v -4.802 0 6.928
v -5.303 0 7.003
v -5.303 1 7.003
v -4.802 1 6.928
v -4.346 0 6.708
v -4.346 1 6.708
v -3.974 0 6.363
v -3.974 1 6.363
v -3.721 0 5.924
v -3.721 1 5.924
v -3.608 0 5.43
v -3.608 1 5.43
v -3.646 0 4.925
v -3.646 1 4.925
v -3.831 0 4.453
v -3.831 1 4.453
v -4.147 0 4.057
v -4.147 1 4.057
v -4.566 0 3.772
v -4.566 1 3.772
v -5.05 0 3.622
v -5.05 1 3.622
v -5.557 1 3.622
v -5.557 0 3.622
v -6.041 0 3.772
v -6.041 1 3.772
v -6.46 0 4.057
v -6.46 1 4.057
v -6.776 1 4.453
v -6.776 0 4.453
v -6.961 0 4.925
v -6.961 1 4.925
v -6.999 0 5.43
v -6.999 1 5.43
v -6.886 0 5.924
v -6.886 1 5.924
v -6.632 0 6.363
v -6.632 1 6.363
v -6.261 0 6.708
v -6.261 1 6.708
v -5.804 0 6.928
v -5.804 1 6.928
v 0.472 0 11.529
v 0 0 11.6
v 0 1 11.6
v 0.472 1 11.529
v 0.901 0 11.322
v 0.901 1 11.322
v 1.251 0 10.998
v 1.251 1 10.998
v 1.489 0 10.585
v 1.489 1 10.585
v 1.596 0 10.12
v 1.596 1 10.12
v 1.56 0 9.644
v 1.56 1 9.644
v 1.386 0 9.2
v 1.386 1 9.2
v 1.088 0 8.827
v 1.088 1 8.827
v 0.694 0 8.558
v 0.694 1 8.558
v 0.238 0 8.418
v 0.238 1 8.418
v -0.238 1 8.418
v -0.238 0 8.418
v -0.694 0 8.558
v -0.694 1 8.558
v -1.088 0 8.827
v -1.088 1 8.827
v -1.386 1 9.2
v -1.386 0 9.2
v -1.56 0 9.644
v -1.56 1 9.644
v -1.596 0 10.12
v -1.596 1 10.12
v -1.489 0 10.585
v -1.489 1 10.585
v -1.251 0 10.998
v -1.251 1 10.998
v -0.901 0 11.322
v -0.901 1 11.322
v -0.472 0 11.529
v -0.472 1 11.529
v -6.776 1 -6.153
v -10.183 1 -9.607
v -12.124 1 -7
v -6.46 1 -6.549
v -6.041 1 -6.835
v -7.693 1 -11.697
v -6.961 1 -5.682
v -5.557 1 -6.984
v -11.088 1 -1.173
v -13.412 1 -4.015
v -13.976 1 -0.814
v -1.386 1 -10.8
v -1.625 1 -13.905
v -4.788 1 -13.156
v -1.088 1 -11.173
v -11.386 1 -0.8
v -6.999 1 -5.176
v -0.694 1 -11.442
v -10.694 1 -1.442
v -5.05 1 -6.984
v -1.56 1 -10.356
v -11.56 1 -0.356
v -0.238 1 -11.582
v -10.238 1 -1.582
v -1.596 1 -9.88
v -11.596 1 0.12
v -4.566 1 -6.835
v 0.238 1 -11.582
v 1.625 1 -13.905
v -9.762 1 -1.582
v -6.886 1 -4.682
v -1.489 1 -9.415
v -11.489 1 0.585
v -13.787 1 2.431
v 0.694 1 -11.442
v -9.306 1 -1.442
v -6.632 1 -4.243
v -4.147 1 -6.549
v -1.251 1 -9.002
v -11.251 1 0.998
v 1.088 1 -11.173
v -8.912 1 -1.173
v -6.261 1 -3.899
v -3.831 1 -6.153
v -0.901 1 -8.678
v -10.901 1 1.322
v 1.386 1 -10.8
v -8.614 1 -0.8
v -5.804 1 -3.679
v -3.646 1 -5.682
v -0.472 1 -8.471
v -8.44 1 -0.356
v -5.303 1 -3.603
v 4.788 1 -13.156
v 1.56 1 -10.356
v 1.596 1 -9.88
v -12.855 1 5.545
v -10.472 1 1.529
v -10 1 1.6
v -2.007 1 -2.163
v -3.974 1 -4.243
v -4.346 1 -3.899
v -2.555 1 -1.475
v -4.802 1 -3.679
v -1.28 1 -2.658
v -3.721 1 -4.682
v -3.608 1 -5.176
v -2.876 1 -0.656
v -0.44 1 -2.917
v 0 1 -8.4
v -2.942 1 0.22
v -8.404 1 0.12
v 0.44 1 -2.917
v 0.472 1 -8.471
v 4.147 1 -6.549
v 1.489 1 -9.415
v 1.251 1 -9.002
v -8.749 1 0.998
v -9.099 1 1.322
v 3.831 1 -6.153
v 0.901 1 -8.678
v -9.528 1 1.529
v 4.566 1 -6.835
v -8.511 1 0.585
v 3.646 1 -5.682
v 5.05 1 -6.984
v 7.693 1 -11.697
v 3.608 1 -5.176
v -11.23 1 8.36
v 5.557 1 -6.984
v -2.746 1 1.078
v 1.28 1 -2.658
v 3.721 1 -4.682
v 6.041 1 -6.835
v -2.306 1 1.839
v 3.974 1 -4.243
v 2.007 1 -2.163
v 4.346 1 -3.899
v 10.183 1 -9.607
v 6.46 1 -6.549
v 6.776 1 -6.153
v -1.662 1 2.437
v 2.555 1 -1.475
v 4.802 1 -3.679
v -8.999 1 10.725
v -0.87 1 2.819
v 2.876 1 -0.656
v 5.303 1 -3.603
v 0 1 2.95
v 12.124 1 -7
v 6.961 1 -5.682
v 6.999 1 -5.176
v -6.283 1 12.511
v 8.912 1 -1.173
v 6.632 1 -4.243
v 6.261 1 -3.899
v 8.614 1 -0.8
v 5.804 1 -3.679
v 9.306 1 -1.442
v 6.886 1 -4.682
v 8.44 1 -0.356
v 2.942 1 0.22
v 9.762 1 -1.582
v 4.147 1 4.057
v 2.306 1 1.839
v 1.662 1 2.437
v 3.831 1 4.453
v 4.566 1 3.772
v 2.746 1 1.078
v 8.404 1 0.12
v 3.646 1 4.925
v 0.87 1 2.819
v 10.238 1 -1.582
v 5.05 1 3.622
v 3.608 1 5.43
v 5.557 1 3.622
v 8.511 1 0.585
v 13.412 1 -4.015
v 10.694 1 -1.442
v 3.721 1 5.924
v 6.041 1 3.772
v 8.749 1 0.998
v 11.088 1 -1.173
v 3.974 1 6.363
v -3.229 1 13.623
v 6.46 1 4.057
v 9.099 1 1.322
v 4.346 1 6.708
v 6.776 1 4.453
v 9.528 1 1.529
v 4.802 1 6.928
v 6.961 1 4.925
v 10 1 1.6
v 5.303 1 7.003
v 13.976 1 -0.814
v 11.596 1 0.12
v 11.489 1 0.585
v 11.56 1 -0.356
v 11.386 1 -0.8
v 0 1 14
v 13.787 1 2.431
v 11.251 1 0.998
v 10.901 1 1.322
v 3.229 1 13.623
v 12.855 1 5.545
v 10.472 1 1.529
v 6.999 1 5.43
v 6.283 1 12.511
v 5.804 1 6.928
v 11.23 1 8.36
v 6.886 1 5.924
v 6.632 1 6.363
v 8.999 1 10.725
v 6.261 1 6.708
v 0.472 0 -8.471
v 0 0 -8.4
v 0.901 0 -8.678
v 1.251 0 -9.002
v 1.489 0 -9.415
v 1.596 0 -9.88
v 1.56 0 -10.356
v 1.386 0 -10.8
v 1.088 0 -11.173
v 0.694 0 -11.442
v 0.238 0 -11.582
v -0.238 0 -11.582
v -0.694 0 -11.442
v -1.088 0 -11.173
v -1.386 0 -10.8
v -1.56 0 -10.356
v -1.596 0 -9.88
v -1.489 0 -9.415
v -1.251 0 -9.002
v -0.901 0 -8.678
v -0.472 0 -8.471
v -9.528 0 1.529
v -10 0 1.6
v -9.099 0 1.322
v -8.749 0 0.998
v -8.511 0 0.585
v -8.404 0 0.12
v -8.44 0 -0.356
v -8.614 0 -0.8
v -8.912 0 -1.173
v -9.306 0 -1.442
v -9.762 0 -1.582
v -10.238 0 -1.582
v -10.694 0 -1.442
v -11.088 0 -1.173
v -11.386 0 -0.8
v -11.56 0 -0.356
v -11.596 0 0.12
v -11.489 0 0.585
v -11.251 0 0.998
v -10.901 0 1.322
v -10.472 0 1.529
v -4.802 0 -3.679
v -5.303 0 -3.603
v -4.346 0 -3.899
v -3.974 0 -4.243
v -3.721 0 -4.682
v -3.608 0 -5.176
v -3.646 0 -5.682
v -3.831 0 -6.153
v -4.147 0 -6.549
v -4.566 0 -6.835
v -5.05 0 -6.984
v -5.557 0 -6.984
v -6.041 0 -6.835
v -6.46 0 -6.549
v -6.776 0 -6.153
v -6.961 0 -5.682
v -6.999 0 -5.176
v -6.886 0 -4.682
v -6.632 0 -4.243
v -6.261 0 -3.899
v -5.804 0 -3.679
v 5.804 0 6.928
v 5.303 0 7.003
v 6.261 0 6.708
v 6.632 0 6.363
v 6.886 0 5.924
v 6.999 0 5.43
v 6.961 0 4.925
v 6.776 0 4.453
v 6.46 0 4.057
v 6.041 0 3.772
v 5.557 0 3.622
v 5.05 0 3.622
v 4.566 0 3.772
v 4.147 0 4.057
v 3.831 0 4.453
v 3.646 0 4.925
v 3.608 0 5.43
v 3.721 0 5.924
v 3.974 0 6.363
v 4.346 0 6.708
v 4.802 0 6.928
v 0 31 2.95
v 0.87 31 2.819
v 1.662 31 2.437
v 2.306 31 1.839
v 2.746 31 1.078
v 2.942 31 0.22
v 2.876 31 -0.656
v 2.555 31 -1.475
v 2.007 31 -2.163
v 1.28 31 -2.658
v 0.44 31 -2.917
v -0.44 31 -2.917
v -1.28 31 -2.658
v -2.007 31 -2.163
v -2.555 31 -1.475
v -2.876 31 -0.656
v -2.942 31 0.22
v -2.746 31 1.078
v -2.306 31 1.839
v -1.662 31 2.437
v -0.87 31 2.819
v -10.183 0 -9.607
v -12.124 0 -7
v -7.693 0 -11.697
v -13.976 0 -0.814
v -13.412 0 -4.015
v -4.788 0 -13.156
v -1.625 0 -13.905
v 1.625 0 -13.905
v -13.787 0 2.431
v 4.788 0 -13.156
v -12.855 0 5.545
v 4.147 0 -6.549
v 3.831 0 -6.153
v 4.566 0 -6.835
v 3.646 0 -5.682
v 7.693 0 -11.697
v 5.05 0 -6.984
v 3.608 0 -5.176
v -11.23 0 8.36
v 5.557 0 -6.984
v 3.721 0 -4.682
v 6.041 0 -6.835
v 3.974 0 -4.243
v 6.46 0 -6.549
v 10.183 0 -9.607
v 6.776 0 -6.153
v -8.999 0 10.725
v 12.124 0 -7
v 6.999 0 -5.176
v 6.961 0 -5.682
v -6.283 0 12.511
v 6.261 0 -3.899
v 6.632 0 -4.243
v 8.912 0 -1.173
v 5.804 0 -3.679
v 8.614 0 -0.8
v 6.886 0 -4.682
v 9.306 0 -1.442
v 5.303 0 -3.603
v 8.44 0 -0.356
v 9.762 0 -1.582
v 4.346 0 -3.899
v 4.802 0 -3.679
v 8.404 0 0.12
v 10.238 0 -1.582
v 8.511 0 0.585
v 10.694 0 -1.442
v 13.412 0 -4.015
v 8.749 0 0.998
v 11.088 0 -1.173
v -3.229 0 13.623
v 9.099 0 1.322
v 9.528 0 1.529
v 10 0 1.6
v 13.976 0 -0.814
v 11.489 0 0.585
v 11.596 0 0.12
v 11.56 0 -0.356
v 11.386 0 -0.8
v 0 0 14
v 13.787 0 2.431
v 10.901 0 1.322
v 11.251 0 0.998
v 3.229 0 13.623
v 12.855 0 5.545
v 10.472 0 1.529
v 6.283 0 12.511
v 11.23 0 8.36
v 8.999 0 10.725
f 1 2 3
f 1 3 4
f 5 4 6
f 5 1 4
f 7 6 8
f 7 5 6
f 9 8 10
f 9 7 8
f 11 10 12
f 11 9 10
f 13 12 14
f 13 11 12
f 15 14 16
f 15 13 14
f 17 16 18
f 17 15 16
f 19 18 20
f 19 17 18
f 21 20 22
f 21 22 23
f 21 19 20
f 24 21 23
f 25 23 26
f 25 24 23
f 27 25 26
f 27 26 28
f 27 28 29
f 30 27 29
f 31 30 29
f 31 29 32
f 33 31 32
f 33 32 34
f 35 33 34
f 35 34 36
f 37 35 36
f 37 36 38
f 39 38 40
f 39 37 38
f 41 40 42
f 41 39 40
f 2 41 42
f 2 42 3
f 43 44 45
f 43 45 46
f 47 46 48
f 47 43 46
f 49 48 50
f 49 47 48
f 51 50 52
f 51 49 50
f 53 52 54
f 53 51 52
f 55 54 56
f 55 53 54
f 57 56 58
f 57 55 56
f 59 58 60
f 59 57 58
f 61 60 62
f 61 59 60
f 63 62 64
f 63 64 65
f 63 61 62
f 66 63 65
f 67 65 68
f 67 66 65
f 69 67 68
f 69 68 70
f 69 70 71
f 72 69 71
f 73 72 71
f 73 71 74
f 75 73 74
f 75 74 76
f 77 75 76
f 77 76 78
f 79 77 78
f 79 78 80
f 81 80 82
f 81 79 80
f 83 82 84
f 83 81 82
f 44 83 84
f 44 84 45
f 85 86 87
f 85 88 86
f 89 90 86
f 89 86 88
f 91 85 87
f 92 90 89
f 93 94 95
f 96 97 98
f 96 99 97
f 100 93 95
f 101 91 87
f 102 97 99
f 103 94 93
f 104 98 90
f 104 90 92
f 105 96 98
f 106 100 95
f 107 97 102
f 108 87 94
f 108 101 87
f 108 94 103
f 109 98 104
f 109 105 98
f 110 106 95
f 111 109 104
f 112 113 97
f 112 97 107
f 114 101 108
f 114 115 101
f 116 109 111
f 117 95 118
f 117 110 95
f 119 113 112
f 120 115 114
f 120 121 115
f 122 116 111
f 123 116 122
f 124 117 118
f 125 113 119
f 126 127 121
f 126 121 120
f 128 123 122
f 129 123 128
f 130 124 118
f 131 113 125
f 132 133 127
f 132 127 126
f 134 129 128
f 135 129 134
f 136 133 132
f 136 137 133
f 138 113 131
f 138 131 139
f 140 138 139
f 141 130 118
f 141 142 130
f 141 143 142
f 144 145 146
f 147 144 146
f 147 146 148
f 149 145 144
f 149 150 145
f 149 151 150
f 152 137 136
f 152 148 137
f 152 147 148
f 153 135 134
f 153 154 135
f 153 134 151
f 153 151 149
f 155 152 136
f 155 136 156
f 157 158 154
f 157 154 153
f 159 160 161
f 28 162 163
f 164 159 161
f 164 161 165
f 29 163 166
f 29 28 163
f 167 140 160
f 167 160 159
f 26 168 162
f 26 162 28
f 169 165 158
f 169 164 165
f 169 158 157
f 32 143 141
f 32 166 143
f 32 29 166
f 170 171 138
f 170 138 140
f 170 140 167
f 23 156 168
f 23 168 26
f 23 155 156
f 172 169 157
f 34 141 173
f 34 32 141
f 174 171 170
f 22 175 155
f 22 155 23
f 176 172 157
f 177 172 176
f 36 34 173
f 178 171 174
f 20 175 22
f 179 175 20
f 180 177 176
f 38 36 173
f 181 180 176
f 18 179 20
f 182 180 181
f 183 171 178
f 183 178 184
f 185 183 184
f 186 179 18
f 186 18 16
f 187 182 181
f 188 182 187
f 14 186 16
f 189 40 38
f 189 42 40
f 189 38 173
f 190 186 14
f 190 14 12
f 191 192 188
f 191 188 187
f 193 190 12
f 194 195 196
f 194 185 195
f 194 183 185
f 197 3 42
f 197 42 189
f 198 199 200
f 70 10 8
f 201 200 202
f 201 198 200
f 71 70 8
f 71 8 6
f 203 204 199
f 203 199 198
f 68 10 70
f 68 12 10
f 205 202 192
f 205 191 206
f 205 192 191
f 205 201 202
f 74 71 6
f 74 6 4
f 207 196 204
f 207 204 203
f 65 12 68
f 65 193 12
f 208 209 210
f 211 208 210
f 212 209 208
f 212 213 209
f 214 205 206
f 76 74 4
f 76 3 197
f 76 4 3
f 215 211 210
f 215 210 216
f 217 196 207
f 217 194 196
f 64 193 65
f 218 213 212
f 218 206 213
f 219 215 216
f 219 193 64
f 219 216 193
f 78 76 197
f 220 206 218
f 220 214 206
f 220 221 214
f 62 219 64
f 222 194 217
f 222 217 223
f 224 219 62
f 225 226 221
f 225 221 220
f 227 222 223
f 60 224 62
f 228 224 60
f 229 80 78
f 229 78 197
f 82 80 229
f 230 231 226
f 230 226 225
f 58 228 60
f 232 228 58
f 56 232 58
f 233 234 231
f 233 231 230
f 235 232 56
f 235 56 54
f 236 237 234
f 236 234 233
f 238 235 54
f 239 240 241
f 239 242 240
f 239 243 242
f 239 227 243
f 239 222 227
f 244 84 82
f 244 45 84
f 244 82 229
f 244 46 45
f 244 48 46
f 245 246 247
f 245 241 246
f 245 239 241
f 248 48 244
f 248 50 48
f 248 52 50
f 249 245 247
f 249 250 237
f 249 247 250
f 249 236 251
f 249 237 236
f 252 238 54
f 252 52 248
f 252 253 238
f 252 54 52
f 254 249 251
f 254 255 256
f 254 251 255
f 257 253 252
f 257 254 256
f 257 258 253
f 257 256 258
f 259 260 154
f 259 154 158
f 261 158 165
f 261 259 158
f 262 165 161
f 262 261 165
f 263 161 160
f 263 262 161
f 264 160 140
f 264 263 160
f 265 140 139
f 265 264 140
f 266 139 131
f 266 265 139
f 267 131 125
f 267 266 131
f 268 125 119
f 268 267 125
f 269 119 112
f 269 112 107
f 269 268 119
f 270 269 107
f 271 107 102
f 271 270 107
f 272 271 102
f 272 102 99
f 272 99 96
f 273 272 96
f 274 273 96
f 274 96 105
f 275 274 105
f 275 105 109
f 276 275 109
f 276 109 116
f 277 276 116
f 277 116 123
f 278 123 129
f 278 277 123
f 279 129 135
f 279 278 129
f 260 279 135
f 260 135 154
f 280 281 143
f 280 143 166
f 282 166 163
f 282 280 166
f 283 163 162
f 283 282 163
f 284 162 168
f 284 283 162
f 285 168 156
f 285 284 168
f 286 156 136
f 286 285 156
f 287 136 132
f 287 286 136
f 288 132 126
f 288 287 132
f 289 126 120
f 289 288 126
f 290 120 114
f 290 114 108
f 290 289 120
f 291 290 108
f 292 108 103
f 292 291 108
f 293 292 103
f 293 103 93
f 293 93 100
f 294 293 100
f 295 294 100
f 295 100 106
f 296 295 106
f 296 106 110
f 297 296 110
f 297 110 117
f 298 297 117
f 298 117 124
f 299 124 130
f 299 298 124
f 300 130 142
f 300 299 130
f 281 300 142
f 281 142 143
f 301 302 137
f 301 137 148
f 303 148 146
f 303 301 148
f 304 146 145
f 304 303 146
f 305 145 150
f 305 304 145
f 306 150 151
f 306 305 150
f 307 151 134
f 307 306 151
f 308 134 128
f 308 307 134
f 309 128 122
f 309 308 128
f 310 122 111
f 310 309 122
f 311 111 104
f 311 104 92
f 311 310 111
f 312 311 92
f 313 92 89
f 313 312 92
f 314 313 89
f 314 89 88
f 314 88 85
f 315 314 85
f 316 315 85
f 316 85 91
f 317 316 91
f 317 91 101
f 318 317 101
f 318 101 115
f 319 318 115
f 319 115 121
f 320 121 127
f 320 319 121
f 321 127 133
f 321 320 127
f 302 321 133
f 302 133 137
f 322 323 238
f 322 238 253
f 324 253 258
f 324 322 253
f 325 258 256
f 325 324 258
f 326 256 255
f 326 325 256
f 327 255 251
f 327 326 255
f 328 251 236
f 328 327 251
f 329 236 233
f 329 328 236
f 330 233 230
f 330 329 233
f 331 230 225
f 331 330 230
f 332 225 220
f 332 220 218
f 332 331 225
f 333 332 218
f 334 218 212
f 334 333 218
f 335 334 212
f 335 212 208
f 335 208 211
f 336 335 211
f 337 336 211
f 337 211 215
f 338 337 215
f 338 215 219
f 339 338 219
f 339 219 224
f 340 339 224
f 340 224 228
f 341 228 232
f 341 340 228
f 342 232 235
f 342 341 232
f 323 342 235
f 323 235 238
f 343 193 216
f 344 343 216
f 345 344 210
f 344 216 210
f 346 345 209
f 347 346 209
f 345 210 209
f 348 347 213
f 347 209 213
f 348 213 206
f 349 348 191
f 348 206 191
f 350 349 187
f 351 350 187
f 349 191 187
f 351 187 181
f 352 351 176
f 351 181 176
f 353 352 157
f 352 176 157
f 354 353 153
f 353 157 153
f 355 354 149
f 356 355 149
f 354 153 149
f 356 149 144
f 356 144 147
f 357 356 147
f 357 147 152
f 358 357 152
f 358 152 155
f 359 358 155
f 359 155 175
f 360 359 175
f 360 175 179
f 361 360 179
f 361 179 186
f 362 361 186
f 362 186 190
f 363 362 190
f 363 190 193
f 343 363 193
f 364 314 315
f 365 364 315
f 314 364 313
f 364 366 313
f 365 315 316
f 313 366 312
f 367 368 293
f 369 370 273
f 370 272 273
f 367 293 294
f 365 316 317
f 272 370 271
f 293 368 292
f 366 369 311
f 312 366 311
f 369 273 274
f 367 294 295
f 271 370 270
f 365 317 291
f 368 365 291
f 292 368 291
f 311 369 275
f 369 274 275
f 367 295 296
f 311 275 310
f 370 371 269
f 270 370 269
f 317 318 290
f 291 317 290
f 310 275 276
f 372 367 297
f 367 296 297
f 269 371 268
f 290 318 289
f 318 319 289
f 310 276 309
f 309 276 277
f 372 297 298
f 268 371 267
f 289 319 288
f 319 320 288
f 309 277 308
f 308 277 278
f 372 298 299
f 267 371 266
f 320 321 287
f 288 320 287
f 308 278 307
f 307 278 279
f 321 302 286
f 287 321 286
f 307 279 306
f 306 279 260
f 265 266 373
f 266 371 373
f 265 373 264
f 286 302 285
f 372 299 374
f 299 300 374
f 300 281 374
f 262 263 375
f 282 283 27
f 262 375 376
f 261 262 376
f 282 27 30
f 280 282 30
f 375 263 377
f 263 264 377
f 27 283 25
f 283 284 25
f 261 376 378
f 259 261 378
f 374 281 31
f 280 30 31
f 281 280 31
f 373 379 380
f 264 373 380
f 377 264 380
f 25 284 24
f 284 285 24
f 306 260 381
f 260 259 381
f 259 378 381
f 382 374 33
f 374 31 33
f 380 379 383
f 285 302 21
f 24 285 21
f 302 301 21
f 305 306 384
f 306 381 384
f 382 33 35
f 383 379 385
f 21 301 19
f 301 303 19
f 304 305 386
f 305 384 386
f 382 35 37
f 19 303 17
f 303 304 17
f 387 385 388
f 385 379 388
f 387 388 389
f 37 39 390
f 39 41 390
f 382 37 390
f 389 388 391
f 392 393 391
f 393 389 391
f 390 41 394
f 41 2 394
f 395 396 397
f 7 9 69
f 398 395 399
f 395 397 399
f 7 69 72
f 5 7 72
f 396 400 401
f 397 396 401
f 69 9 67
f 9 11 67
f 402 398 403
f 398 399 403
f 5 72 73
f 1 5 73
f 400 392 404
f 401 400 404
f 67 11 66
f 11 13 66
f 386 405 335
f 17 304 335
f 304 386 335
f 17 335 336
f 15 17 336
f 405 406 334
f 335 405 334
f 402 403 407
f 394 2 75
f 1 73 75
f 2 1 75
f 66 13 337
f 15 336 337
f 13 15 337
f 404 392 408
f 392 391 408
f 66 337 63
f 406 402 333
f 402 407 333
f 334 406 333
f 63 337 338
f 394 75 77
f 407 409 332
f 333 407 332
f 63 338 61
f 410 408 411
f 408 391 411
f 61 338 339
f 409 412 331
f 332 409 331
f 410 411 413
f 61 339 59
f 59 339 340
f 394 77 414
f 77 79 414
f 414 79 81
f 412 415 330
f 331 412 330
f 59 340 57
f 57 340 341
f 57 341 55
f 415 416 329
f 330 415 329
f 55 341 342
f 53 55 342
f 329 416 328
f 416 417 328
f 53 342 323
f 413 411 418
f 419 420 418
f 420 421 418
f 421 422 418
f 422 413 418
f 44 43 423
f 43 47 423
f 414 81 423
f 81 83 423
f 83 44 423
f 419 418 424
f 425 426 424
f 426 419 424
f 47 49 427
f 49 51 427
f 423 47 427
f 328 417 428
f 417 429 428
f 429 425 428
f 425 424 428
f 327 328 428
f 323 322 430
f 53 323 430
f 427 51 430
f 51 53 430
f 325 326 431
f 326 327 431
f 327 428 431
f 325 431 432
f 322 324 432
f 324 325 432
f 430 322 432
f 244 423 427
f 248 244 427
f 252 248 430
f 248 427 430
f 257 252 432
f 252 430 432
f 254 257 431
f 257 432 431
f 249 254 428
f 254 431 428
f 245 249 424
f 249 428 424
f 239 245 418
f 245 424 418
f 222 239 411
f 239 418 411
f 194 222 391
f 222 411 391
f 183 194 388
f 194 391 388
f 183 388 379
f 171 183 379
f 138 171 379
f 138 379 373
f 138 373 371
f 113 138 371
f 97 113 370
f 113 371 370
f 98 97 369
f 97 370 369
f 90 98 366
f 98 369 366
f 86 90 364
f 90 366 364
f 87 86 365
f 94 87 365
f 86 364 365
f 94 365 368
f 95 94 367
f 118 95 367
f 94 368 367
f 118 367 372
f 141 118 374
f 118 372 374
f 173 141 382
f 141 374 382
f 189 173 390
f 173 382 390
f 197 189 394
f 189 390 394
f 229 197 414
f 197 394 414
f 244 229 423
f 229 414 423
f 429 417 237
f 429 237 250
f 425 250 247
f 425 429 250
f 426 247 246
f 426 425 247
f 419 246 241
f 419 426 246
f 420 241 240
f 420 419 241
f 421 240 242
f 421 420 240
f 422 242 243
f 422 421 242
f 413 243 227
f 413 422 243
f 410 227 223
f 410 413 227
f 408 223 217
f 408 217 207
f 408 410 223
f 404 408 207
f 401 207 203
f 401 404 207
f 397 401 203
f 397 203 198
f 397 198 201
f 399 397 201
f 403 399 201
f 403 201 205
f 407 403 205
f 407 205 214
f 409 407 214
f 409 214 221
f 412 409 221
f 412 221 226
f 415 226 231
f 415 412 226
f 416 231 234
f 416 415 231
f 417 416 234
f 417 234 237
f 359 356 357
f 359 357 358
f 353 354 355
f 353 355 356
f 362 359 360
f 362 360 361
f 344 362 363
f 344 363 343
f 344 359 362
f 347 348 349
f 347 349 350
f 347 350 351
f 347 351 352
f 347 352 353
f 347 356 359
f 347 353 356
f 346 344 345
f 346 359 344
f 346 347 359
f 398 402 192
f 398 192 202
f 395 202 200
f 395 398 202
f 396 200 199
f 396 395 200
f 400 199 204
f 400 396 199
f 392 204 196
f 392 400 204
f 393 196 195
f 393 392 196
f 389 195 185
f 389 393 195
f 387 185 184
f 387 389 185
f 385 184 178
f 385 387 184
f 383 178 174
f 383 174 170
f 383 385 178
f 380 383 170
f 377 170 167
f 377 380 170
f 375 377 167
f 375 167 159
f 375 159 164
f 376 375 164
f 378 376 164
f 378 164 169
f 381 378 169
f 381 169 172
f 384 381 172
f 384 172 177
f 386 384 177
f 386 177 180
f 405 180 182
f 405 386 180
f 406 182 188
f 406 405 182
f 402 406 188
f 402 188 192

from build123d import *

# Parameters (mm, degrees)
SKETCH1_R           = 14
SKETCH1_R_2         = 1.6
SKETCH1_R_3         = 1.7
SKETCH1_R_4         = 2.95
BOSS_EXTRUDE1_DEPTH = 1
SKETCH1_3_R         = 2.95
BOSS_EXTRUDE2_DEPTH = 31


with BuildPart() as part:
    # Sketch1 → Boss-Extrude1 (new body)
    with BuildSketch(Plane(origin=(0, 0, 0), x_dir=(1, 0, 0), z_dir=(0, 1, 0))):
        Circle(SKETCH1_R)
        with Locations((0, 10)):
            Circle(SKETCH1_R_2, mode=Mode.SUBTRACT)
        with Locations((-10, 0)):
            Circle(SKETCH1_R_2, mode=Mode.SUBTRACT)
        with Locations((0, -10)):
            Circle(SKETCH1_R_2, mode=Mode.SUBTRACT)
        with Locations((10, 0)):
            Circle(SKETCH1_R_2, mode=Mode.SUBTRACT)
        with Locations((5.303300859, -5.303300859)):
            Circle(SKETCH1_R_3, mode=Mode.SUBTRACT)
        with Locations((-5.303300859, 5.303300859)):
            Circle(SKETCH1_R_3, mode=Mode.SUBTRACT)
        Circle(SKETCH1_R_4, mode=Mode.SUBTRACT)
        with Locations((5.303300859, 5.303300859)):
            Circle(SKETCH1_R_3, mode=Mode.SUBTRACT)
        with Locations((-5.303300859, -5.303300859)):
            Circle(SKETCH1_R_3, mode=Mode.SUBTRACT)
    extrude(amount=BOSS_EXTRUDE1_DEPTH)

    # Sketch1<3> → Boss-Extrude2 (add)
    with BuildSketch(Plane(origin=(0, 0, 0), x_dir=(1, 0, 0), z_dir=(0, 1, 0))):
        Circle(SKETCH1_3_R)
    extrude(amount=BOSS_EXTRUDE2_DEPTH)


solid = part.part
